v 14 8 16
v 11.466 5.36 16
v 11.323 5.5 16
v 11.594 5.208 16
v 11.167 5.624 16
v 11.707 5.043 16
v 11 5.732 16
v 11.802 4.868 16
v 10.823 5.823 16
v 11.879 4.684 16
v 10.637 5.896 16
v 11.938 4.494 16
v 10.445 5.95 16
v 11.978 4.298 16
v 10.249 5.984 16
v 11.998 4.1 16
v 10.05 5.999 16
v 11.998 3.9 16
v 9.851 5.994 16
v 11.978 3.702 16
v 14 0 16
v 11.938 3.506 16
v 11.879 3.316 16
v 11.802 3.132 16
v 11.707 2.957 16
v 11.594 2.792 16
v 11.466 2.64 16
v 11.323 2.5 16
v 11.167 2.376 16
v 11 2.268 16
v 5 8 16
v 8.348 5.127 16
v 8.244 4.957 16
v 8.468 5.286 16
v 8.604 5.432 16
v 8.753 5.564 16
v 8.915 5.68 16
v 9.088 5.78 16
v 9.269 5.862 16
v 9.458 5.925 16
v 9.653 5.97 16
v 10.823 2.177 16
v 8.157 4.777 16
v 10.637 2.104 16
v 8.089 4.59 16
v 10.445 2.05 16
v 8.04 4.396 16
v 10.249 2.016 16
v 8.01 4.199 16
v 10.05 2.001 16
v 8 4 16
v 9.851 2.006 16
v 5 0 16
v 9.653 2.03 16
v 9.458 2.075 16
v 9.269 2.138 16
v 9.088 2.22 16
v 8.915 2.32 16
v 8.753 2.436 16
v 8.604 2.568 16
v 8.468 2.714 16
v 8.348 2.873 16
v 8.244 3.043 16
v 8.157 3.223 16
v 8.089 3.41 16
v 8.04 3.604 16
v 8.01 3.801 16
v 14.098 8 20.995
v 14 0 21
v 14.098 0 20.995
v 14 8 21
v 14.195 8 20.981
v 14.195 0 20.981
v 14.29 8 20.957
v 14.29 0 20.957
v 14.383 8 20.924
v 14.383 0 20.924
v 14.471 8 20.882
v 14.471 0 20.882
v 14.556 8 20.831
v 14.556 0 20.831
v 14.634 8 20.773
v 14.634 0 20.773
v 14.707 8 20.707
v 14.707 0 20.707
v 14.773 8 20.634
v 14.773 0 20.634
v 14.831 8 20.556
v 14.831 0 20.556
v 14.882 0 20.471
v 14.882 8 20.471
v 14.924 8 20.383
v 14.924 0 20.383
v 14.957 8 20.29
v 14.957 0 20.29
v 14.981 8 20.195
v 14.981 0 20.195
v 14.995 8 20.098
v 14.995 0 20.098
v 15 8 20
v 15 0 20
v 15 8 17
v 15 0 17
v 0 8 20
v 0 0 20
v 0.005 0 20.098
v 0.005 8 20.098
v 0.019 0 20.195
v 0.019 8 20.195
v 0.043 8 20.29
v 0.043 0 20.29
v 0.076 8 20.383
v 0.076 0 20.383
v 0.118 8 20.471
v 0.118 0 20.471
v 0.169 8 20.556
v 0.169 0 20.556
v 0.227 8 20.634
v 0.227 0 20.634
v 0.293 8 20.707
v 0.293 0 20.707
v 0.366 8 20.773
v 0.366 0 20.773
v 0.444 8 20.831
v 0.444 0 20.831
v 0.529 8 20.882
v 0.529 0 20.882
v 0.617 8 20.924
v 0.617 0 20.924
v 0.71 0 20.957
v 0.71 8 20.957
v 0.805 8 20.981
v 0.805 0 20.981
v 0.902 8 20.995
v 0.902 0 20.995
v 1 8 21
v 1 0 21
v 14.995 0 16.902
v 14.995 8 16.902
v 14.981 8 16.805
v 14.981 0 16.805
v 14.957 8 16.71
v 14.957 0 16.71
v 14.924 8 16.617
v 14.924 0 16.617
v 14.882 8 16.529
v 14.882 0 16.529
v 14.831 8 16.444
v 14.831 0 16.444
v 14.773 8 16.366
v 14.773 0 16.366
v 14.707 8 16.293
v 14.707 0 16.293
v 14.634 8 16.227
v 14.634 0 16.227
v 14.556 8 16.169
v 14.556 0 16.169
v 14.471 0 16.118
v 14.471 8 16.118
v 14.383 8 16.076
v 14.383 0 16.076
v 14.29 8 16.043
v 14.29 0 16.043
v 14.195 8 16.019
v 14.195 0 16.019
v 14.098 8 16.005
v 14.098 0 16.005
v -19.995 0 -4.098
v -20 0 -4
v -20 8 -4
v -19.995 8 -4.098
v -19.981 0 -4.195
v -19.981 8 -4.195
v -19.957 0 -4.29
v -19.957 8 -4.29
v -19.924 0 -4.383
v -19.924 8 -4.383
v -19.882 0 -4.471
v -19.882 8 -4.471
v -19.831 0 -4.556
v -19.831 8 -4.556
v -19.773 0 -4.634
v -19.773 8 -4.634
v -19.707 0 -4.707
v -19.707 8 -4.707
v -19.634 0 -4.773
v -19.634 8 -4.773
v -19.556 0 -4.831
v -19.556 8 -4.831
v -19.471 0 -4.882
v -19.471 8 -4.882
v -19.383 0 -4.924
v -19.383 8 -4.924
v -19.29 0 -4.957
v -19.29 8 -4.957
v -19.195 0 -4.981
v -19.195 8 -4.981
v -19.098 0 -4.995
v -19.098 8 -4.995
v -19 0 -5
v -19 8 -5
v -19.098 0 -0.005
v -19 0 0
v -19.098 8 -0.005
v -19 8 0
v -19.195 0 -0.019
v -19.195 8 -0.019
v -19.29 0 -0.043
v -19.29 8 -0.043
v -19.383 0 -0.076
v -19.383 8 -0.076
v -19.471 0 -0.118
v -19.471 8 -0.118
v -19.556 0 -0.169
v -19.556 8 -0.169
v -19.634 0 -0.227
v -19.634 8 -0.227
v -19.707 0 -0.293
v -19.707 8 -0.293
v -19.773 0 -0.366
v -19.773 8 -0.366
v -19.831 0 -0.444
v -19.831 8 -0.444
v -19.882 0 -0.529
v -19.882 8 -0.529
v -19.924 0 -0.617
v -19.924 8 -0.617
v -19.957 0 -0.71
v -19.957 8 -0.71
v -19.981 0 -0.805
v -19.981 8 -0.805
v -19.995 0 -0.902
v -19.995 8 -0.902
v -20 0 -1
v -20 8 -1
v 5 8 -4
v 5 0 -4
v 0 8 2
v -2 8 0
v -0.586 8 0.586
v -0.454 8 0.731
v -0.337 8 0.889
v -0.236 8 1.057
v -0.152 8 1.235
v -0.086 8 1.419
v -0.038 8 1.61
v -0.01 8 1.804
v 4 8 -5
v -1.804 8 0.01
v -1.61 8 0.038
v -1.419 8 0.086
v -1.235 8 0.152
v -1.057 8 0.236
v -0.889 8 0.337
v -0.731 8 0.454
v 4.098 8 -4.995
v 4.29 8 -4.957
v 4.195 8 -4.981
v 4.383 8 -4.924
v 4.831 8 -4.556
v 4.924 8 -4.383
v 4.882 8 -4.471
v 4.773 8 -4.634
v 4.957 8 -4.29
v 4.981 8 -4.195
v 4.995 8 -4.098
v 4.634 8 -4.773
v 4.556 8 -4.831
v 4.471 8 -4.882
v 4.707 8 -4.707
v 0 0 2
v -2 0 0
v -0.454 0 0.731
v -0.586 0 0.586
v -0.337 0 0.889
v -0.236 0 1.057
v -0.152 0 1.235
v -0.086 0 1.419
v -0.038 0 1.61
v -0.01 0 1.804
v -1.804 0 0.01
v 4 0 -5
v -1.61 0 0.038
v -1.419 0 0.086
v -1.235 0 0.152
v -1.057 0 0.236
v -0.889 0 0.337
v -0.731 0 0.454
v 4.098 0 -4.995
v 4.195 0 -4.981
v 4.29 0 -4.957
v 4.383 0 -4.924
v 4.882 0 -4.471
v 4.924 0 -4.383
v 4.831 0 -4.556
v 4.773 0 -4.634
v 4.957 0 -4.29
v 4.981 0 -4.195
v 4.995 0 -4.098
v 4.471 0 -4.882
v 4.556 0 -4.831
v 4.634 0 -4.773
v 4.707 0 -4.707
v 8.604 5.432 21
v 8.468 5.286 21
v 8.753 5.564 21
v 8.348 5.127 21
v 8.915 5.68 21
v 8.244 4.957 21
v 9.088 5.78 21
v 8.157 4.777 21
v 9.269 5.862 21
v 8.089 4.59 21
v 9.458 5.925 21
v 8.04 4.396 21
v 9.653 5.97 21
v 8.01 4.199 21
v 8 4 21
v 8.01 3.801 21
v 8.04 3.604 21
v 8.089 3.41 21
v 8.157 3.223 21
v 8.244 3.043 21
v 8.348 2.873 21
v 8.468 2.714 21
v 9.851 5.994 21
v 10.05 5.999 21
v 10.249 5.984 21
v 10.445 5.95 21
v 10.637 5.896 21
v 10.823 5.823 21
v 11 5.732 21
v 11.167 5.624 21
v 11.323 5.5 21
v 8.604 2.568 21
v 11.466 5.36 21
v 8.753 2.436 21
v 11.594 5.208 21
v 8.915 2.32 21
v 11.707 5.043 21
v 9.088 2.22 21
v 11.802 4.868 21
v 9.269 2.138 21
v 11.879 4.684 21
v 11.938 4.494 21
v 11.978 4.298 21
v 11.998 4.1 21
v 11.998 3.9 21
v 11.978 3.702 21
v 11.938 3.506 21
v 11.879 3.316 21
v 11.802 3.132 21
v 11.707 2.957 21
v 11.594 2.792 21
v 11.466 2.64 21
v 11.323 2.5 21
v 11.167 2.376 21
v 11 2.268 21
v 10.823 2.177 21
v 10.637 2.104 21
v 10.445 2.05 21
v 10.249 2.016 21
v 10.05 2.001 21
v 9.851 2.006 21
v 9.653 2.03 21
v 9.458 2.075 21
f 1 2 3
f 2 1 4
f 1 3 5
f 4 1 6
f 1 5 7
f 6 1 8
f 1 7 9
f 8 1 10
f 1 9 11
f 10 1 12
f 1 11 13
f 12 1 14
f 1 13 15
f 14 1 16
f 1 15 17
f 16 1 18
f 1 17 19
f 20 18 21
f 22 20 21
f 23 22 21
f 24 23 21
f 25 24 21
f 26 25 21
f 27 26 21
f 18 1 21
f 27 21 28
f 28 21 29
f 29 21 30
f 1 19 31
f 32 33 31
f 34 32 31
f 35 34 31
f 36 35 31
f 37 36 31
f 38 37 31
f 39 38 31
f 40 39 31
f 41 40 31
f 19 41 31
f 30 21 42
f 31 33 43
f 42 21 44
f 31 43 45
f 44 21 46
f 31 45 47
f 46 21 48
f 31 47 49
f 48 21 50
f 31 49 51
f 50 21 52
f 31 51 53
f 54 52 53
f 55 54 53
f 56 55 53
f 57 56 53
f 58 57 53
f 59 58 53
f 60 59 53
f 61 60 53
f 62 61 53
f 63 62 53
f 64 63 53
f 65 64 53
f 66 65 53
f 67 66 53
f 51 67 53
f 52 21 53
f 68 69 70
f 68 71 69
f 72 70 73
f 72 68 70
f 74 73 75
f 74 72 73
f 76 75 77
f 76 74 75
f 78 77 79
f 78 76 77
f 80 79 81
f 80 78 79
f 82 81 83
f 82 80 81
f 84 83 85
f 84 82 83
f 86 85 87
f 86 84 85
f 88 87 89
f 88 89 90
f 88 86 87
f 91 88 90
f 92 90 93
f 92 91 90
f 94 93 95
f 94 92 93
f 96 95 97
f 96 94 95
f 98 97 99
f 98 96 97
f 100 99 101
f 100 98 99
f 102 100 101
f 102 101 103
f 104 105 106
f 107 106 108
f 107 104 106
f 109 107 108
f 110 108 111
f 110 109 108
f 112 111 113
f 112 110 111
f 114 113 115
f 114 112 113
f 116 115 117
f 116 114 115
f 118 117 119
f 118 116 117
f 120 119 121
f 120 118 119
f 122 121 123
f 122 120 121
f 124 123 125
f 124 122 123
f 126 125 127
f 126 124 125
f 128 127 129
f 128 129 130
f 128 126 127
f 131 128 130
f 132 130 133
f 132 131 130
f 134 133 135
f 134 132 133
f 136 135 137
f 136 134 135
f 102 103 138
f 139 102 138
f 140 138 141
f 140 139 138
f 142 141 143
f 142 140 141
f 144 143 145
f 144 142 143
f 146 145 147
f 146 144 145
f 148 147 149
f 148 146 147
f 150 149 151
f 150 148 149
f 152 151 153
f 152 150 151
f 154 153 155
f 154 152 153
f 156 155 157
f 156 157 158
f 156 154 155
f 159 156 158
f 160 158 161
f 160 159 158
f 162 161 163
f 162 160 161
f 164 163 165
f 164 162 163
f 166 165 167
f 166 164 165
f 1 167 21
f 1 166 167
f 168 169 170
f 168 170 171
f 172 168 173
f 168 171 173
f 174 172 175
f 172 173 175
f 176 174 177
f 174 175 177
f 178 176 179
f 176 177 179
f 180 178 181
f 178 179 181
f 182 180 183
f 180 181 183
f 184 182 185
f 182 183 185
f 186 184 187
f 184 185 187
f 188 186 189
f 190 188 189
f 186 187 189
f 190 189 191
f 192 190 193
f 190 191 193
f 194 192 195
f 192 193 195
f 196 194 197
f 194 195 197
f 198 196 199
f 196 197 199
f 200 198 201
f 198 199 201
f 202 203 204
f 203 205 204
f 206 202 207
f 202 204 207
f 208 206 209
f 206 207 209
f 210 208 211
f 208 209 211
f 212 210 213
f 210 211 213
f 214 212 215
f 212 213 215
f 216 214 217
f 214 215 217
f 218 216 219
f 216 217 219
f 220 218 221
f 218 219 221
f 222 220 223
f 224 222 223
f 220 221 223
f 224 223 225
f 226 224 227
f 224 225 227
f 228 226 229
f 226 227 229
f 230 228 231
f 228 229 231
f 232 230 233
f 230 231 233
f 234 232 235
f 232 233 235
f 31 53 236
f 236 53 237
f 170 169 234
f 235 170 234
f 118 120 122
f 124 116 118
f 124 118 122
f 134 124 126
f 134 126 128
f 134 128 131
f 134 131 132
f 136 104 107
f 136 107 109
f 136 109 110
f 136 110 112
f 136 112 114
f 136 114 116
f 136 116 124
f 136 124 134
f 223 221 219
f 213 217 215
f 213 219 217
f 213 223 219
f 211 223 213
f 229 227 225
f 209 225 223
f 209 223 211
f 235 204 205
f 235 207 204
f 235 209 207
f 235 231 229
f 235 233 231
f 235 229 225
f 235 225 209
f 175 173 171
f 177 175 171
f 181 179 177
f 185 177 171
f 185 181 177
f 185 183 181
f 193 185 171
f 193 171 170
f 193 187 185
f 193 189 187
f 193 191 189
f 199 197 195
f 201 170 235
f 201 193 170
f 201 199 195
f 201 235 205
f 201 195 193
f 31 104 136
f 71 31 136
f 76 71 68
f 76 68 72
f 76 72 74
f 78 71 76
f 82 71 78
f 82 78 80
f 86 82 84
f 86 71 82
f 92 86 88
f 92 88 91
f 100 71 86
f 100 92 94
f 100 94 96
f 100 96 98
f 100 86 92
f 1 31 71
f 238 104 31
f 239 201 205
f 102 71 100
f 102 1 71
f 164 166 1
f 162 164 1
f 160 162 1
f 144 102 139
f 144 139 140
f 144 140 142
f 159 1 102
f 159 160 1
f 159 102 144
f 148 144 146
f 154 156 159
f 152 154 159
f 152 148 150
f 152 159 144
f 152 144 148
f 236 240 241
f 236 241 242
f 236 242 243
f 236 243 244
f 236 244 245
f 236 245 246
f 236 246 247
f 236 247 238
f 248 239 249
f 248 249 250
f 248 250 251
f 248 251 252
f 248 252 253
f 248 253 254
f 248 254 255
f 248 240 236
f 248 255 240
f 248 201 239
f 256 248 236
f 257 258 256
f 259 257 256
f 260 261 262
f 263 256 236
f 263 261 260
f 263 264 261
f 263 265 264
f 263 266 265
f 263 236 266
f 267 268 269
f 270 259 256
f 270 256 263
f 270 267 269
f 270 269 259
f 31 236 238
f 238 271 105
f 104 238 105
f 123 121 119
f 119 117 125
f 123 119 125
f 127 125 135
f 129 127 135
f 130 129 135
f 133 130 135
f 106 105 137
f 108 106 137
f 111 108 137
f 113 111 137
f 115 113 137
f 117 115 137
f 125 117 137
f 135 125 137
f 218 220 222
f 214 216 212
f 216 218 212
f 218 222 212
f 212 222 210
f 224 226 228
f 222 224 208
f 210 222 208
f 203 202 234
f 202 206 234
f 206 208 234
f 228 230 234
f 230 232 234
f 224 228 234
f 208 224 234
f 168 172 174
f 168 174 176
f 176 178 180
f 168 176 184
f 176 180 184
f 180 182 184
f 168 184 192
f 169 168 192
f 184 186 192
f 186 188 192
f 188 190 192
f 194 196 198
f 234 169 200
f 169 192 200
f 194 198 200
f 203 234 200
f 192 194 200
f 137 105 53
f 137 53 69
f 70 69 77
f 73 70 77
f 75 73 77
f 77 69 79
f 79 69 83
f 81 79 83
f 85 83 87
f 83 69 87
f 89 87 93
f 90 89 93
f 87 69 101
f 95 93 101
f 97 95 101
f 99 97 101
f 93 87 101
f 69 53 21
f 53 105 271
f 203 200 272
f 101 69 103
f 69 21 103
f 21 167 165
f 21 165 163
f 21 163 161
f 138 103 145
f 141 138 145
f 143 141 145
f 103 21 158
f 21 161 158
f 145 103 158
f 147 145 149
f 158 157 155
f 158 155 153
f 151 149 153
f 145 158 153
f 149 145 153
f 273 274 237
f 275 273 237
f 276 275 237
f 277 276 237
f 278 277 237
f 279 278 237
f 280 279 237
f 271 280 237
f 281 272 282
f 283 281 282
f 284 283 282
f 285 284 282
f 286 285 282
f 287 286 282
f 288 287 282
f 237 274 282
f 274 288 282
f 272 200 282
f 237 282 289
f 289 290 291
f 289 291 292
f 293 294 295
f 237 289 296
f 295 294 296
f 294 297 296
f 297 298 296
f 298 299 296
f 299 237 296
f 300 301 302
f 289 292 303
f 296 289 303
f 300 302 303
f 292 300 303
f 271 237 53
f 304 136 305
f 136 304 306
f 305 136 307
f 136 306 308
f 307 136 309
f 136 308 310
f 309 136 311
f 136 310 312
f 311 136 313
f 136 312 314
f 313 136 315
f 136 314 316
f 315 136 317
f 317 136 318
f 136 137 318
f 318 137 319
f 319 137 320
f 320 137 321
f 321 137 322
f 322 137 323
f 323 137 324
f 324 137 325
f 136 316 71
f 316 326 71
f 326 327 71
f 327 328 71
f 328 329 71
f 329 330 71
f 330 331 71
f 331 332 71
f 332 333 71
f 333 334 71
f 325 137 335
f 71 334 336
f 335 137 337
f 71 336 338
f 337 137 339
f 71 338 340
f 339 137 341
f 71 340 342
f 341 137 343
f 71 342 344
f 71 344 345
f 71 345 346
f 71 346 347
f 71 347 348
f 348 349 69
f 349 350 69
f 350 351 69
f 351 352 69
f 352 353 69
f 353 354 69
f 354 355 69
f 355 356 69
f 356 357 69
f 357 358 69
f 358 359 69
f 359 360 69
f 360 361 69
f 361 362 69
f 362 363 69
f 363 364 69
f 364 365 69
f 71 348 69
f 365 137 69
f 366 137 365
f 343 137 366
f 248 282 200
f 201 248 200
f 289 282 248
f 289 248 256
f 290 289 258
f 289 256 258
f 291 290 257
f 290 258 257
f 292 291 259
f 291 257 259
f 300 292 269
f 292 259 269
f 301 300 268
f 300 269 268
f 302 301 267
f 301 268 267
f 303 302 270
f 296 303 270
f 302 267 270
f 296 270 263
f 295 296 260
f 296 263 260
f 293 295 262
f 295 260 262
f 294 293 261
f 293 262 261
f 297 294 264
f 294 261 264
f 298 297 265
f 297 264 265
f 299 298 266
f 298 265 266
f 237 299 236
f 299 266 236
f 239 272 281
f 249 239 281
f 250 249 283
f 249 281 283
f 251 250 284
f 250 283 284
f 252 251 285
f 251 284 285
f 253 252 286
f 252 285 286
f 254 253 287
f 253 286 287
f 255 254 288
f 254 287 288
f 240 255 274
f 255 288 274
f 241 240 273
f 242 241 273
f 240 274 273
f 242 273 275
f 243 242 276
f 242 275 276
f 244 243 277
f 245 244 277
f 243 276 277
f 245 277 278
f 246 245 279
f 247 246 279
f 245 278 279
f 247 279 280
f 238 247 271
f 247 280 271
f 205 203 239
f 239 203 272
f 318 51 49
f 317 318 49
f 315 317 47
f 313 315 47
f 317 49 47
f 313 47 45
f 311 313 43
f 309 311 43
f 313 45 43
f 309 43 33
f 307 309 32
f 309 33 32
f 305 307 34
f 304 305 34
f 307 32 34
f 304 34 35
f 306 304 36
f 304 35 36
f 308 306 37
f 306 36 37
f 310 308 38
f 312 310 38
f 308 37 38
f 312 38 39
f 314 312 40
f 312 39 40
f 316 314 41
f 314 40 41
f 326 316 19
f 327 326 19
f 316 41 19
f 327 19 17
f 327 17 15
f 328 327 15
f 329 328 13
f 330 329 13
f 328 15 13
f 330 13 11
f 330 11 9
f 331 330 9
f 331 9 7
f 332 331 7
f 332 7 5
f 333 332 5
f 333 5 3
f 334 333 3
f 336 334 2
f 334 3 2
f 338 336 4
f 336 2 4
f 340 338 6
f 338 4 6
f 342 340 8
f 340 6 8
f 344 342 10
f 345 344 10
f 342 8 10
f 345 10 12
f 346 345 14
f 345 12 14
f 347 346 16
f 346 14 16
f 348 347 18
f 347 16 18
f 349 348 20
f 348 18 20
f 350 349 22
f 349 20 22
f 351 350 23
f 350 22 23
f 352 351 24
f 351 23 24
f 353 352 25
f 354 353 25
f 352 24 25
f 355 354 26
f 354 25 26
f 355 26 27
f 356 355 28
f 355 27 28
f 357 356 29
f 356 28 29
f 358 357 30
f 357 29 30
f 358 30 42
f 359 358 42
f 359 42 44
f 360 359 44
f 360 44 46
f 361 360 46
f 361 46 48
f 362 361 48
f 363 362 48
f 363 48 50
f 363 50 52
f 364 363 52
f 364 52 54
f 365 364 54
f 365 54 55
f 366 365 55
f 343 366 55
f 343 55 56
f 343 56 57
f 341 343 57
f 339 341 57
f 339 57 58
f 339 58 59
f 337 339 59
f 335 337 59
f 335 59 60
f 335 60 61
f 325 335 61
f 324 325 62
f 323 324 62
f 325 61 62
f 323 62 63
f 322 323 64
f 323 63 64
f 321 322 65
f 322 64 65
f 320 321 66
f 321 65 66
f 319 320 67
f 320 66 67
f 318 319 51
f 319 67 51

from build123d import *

# Parameters (mm, degrees)
EXTRUDE_1_DEPTH     = 8
SKETCH_2_R          = 2
CUT_EXTRUDE_1_DEPTH = 5
FILLET_1_R          = 1


with BuildPart() as part:
    # 草图1 → 凸台-拉伸1 (new body)
    with BuildSketch(Plane(origin=(0, 0, 0), x_dir=(1, 0, 0), z_dir=(0, 1, 0))):
        with BuildLine():
            Line((-20, 0), (-2, 0))
            ThreePointArc((-2, 0), (-0.585786438, -0.585786438), (0, -2))
            Line((0, -2), (0, -15.720164609))
            Line((0, -15.720164609), (0, -21))
            Line((0, -21), (5, -21))
            Line((5, -21), (15, -21))
            Line((15, -21), (15, -16))
            Line((15, -16), (5, -16))
            Line((5, -16), (5, 0))
            Line((5, 0), (5, 5))
            Line((5, 5), (-20, 5))
            Line((-20, 5), (-20, 0))
        make_face()
    extrude(amount=EXTRUDE_1_DEPTH)

    # 草图2 → 切除-拉伸1 (cut)
    with BuildSketch(Plane(origin=(0, 0, 16), x_dir=(-1, 0, 0), z_dir=(0, 0, -1))):
        with Locations((-10, 4)):
            Circle(SKETCH_2_R)
    extrude(amount=-CUT_EXTRUDE_1_DEPTH, mode=Mode.SUBTRACT)

    # 圆角1
    fillet_1_edges = [part.edges().sort_by_distance(p)[0] for p in [
        (-20, 4, 0),
        (-20, 4, -5),
        (5, 4, -5),
        (15, 4, 16),
        (15, 4, 21),
        (0, 4, 21),
    ]]
    fillet(fillet_1_edges, radius=FILLET_1_R)


solid = part.part
